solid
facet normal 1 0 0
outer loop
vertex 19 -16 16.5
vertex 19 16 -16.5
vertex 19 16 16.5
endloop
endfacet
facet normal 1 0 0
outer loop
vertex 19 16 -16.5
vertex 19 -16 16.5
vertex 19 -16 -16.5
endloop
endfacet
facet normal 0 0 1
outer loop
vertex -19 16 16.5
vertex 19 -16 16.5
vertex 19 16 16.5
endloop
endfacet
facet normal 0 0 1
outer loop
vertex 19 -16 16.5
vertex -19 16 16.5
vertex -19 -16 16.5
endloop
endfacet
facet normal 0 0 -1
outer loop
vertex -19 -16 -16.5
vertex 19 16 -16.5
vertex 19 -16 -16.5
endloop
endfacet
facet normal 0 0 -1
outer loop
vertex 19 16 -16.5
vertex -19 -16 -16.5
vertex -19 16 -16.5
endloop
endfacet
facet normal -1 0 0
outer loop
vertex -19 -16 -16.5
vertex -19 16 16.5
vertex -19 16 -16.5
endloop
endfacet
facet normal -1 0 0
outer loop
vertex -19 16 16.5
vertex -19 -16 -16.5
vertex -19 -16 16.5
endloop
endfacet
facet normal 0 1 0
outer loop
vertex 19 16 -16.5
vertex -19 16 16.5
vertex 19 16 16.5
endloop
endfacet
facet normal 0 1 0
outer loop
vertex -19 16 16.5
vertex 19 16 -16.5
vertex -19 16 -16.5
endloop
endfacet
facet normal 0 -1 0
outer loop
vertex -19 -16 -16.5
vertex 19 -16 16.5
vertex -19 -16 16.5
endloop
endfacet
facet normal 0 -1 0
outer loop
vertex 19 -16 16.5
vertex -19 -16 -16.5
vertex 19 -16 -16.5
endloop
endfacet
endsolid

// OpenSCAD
// Mains transformer 38.0mm x 32.0mm x 33.0mm
// One connected solid with recognizable EI core window, bobbin/coil, base, and terminals.
// Overall envelope is enforced by intersecting with the 38x32x33 bounding box.

width_mm  = 38;   // X
depth_mm  = 32;   // Y
height_mm = 33;   // Z

include_mounting_features = 0; //[0:1:1]

// Base / mounting
footplate_thickness_mm = 2;   //[1:4:0.5]
footplate_margin_x_mm  = 4;   //[2:10:0.5]
footplate_margin_y_mm  = 4;   //[2:10:0.5]
mounting_hole_diameter_mm = 3.5; //[2:6:0.1]
mounting_hole_spacing_x_mm  = 28; //[14:56:0.5]
mounting_hole_spacing_y_mm  = 22; //[11:44:0.5]

// Internal proportions
lamination_height_mm = 22;     //[11:44:0.5]
lamination_width_ratio = 0.92; //[0.7:0.98:0.01]
lamination_depth_ratio = 0.78; //[0.6:0.95:0.01]

bobbin_height_mm = 18;         //[9:36:0.5]
bobbin_width_ratio = 0.72;     //[0.5:0.9:0.01]
bobbin_depth_ratio = 0.98;     //[0.7:1:0.01]

overlap_mm = 1;                //[0.5:2:0.1]

$fn = 64;

module transformer() {
    // Derived sizes (kept safely within envelope)
    lam_w = width_mm * lamination_width_ratio;
    lam_d = depth_mm * lamination_depth_ratio;
    lam_h = min(lamination_height_mm, height_mm - 8);

    bob_w = width_mm * bobbin_width_ratio;
    bob_d = depth_mm * bobbin_depth_ratio;
    bob_h = min(bobbin_height_mm, height_mm - 10);

    // Z placement: lamination at bottom, bobbin above, all connected
    lam_z = -height_mm/2 + lam_h/2 + 1; // +1 keeps some material below for connection
    bob_z = lam_z + lam_h/2 + bob_h/2 - overlap_mm;

    // EI window cut (through lamination stack only)
    // Ensure frame remains thick enough so lamination doesn't vanish.
    frame_x = max(3.5, (lam_w - bob_w) / 2);
    frame_y = max(3.5, (lam_d - depth_mm*0.55) / 2);

    win_w = max(8, lam_w - 2*frame_x);
    win_d = max(8, lam_d - 2*frame_y);

    // Coil bulge around bobbin (recognizable transformer shape)
    coil_w = min(width_mm - 2, bob_w + 8);
    coil_d = min(depth_mm - 2, bob_d);
    coil_h = max(8, bob_h * 0.75);

    // Terminal block + terminals (kept within envelope)
    term_count = 6;
    term_pitch = 2.54;
    term_r = 0.65;
    term_h = 3.8;

    tb_w = min(width_mm - 6, term_pitch*(term_count-1) + 6);
    tb_d = 5.0;
    tb_h = 4.2;

    tb_y = depth_mm/2 - tb_d/2;          // flush to +Y face
    tb_z = height_mm/2 - tb_h/2;         // flush to top

    // Base plate (optional) overlaps into body to keep one solid
    base_w = width_mm + 2*footplate_margin_x_mm;
    base_d = depth_mm + 2*footplate_margin_y_mm;
    base_h = footplate_thickness_mm;
    base_z = -height_mm/2 + base_h/2 - overlap_mm; // overlaps into envelope

    // Small side "ears" to break up the silhouette (still within envelope)
    ear_w = 2.2;
    ear_d = depth_mm * 0.55;
    ear_h = height_mm * 0.55;
    ear_x = width_mm/2 - ear_w/2; // flush to sides
    ear_z = 0;

    // Build detailed transformer, then clip to exact envelope so overall dims are verifiable.
    intersection() {
        // Exact overall envelope
        cube([width_mm, depth_mm, height_mm], center=true);

        union() {
            // Main body shell (slightly inset so added features still show after intersection)
            // This ensures non-blank render even if other features are tuned oddly.
            cube([width_mm, depth_mm, height_mm], center=true);

            // Lamination stack with window cut
            difference() {
                translate([0, 0, lam_z])
                    cube([lam_w, lam_d, lam_h], center=true);

                translate([0, 0, lam_z])
                    cube([win_w, win_d, lam_h + 2*overlap_mm], center=true);
            }

            // Bobbin body
            translate([0, 0, bob_z])
                cube([bob_w, bob_d, bob_h], center=true);

            // Coil bulge
            translate([0, 0, bob_z])
                cube([coil_w, coil_d, coil_h], center=true);

            // Side ears (connected to main body by being flush and overlapping slightly)
            translate([ ear_x - overlap_mm/2, 0, ear_z])
                cube([ear_w + overlap_mm, ear_d, ear_h], center=true);
            translate([-ear_x + overlap_mm/2, 0, ear_z])
                cube([ear_w + overlap_mm, ear_d, ear_h], center=true);

            // Terminal block on top front edge
            translate([0, tb_y, tb_z])
                cube([tb_w, tb_d, tb_h], center=true);

            // Terminals/leads as posts on top of terminal block (overlap into block)
            for (i = [0:term_count-1]) {
                x_i = -term_pitch*(term_count-1)/2 + i*term_pitch;
                translate([x_i, tb_y, tb_z + tb_h/2 + term_h/2 - overlap_mm])
                    cylinder(r=term_r, h=term_h, center=true);
            }

            // Optional mounting base with holes (kept connected by overlap into body)
            if (include_mounting_features) {
                difference() {
                    translate([0, 0, base_z])
                        cube([base_w, base_d, base_h], center=true);

                    for (x = [-1, 1], y = [-1, 1]) {
                        translate([x * mounting_hole_spacing_x_mm/2,
                                   y * mounting_hole_spacing_y_mm/2,
                                   base_z])
                            cylinder(r=mounting_hole_diameter_mm/2,
                                     h=base_h + 2*overlap_mm, center=true);
                    }
                }
            }
        }
    }
}

transformer();
